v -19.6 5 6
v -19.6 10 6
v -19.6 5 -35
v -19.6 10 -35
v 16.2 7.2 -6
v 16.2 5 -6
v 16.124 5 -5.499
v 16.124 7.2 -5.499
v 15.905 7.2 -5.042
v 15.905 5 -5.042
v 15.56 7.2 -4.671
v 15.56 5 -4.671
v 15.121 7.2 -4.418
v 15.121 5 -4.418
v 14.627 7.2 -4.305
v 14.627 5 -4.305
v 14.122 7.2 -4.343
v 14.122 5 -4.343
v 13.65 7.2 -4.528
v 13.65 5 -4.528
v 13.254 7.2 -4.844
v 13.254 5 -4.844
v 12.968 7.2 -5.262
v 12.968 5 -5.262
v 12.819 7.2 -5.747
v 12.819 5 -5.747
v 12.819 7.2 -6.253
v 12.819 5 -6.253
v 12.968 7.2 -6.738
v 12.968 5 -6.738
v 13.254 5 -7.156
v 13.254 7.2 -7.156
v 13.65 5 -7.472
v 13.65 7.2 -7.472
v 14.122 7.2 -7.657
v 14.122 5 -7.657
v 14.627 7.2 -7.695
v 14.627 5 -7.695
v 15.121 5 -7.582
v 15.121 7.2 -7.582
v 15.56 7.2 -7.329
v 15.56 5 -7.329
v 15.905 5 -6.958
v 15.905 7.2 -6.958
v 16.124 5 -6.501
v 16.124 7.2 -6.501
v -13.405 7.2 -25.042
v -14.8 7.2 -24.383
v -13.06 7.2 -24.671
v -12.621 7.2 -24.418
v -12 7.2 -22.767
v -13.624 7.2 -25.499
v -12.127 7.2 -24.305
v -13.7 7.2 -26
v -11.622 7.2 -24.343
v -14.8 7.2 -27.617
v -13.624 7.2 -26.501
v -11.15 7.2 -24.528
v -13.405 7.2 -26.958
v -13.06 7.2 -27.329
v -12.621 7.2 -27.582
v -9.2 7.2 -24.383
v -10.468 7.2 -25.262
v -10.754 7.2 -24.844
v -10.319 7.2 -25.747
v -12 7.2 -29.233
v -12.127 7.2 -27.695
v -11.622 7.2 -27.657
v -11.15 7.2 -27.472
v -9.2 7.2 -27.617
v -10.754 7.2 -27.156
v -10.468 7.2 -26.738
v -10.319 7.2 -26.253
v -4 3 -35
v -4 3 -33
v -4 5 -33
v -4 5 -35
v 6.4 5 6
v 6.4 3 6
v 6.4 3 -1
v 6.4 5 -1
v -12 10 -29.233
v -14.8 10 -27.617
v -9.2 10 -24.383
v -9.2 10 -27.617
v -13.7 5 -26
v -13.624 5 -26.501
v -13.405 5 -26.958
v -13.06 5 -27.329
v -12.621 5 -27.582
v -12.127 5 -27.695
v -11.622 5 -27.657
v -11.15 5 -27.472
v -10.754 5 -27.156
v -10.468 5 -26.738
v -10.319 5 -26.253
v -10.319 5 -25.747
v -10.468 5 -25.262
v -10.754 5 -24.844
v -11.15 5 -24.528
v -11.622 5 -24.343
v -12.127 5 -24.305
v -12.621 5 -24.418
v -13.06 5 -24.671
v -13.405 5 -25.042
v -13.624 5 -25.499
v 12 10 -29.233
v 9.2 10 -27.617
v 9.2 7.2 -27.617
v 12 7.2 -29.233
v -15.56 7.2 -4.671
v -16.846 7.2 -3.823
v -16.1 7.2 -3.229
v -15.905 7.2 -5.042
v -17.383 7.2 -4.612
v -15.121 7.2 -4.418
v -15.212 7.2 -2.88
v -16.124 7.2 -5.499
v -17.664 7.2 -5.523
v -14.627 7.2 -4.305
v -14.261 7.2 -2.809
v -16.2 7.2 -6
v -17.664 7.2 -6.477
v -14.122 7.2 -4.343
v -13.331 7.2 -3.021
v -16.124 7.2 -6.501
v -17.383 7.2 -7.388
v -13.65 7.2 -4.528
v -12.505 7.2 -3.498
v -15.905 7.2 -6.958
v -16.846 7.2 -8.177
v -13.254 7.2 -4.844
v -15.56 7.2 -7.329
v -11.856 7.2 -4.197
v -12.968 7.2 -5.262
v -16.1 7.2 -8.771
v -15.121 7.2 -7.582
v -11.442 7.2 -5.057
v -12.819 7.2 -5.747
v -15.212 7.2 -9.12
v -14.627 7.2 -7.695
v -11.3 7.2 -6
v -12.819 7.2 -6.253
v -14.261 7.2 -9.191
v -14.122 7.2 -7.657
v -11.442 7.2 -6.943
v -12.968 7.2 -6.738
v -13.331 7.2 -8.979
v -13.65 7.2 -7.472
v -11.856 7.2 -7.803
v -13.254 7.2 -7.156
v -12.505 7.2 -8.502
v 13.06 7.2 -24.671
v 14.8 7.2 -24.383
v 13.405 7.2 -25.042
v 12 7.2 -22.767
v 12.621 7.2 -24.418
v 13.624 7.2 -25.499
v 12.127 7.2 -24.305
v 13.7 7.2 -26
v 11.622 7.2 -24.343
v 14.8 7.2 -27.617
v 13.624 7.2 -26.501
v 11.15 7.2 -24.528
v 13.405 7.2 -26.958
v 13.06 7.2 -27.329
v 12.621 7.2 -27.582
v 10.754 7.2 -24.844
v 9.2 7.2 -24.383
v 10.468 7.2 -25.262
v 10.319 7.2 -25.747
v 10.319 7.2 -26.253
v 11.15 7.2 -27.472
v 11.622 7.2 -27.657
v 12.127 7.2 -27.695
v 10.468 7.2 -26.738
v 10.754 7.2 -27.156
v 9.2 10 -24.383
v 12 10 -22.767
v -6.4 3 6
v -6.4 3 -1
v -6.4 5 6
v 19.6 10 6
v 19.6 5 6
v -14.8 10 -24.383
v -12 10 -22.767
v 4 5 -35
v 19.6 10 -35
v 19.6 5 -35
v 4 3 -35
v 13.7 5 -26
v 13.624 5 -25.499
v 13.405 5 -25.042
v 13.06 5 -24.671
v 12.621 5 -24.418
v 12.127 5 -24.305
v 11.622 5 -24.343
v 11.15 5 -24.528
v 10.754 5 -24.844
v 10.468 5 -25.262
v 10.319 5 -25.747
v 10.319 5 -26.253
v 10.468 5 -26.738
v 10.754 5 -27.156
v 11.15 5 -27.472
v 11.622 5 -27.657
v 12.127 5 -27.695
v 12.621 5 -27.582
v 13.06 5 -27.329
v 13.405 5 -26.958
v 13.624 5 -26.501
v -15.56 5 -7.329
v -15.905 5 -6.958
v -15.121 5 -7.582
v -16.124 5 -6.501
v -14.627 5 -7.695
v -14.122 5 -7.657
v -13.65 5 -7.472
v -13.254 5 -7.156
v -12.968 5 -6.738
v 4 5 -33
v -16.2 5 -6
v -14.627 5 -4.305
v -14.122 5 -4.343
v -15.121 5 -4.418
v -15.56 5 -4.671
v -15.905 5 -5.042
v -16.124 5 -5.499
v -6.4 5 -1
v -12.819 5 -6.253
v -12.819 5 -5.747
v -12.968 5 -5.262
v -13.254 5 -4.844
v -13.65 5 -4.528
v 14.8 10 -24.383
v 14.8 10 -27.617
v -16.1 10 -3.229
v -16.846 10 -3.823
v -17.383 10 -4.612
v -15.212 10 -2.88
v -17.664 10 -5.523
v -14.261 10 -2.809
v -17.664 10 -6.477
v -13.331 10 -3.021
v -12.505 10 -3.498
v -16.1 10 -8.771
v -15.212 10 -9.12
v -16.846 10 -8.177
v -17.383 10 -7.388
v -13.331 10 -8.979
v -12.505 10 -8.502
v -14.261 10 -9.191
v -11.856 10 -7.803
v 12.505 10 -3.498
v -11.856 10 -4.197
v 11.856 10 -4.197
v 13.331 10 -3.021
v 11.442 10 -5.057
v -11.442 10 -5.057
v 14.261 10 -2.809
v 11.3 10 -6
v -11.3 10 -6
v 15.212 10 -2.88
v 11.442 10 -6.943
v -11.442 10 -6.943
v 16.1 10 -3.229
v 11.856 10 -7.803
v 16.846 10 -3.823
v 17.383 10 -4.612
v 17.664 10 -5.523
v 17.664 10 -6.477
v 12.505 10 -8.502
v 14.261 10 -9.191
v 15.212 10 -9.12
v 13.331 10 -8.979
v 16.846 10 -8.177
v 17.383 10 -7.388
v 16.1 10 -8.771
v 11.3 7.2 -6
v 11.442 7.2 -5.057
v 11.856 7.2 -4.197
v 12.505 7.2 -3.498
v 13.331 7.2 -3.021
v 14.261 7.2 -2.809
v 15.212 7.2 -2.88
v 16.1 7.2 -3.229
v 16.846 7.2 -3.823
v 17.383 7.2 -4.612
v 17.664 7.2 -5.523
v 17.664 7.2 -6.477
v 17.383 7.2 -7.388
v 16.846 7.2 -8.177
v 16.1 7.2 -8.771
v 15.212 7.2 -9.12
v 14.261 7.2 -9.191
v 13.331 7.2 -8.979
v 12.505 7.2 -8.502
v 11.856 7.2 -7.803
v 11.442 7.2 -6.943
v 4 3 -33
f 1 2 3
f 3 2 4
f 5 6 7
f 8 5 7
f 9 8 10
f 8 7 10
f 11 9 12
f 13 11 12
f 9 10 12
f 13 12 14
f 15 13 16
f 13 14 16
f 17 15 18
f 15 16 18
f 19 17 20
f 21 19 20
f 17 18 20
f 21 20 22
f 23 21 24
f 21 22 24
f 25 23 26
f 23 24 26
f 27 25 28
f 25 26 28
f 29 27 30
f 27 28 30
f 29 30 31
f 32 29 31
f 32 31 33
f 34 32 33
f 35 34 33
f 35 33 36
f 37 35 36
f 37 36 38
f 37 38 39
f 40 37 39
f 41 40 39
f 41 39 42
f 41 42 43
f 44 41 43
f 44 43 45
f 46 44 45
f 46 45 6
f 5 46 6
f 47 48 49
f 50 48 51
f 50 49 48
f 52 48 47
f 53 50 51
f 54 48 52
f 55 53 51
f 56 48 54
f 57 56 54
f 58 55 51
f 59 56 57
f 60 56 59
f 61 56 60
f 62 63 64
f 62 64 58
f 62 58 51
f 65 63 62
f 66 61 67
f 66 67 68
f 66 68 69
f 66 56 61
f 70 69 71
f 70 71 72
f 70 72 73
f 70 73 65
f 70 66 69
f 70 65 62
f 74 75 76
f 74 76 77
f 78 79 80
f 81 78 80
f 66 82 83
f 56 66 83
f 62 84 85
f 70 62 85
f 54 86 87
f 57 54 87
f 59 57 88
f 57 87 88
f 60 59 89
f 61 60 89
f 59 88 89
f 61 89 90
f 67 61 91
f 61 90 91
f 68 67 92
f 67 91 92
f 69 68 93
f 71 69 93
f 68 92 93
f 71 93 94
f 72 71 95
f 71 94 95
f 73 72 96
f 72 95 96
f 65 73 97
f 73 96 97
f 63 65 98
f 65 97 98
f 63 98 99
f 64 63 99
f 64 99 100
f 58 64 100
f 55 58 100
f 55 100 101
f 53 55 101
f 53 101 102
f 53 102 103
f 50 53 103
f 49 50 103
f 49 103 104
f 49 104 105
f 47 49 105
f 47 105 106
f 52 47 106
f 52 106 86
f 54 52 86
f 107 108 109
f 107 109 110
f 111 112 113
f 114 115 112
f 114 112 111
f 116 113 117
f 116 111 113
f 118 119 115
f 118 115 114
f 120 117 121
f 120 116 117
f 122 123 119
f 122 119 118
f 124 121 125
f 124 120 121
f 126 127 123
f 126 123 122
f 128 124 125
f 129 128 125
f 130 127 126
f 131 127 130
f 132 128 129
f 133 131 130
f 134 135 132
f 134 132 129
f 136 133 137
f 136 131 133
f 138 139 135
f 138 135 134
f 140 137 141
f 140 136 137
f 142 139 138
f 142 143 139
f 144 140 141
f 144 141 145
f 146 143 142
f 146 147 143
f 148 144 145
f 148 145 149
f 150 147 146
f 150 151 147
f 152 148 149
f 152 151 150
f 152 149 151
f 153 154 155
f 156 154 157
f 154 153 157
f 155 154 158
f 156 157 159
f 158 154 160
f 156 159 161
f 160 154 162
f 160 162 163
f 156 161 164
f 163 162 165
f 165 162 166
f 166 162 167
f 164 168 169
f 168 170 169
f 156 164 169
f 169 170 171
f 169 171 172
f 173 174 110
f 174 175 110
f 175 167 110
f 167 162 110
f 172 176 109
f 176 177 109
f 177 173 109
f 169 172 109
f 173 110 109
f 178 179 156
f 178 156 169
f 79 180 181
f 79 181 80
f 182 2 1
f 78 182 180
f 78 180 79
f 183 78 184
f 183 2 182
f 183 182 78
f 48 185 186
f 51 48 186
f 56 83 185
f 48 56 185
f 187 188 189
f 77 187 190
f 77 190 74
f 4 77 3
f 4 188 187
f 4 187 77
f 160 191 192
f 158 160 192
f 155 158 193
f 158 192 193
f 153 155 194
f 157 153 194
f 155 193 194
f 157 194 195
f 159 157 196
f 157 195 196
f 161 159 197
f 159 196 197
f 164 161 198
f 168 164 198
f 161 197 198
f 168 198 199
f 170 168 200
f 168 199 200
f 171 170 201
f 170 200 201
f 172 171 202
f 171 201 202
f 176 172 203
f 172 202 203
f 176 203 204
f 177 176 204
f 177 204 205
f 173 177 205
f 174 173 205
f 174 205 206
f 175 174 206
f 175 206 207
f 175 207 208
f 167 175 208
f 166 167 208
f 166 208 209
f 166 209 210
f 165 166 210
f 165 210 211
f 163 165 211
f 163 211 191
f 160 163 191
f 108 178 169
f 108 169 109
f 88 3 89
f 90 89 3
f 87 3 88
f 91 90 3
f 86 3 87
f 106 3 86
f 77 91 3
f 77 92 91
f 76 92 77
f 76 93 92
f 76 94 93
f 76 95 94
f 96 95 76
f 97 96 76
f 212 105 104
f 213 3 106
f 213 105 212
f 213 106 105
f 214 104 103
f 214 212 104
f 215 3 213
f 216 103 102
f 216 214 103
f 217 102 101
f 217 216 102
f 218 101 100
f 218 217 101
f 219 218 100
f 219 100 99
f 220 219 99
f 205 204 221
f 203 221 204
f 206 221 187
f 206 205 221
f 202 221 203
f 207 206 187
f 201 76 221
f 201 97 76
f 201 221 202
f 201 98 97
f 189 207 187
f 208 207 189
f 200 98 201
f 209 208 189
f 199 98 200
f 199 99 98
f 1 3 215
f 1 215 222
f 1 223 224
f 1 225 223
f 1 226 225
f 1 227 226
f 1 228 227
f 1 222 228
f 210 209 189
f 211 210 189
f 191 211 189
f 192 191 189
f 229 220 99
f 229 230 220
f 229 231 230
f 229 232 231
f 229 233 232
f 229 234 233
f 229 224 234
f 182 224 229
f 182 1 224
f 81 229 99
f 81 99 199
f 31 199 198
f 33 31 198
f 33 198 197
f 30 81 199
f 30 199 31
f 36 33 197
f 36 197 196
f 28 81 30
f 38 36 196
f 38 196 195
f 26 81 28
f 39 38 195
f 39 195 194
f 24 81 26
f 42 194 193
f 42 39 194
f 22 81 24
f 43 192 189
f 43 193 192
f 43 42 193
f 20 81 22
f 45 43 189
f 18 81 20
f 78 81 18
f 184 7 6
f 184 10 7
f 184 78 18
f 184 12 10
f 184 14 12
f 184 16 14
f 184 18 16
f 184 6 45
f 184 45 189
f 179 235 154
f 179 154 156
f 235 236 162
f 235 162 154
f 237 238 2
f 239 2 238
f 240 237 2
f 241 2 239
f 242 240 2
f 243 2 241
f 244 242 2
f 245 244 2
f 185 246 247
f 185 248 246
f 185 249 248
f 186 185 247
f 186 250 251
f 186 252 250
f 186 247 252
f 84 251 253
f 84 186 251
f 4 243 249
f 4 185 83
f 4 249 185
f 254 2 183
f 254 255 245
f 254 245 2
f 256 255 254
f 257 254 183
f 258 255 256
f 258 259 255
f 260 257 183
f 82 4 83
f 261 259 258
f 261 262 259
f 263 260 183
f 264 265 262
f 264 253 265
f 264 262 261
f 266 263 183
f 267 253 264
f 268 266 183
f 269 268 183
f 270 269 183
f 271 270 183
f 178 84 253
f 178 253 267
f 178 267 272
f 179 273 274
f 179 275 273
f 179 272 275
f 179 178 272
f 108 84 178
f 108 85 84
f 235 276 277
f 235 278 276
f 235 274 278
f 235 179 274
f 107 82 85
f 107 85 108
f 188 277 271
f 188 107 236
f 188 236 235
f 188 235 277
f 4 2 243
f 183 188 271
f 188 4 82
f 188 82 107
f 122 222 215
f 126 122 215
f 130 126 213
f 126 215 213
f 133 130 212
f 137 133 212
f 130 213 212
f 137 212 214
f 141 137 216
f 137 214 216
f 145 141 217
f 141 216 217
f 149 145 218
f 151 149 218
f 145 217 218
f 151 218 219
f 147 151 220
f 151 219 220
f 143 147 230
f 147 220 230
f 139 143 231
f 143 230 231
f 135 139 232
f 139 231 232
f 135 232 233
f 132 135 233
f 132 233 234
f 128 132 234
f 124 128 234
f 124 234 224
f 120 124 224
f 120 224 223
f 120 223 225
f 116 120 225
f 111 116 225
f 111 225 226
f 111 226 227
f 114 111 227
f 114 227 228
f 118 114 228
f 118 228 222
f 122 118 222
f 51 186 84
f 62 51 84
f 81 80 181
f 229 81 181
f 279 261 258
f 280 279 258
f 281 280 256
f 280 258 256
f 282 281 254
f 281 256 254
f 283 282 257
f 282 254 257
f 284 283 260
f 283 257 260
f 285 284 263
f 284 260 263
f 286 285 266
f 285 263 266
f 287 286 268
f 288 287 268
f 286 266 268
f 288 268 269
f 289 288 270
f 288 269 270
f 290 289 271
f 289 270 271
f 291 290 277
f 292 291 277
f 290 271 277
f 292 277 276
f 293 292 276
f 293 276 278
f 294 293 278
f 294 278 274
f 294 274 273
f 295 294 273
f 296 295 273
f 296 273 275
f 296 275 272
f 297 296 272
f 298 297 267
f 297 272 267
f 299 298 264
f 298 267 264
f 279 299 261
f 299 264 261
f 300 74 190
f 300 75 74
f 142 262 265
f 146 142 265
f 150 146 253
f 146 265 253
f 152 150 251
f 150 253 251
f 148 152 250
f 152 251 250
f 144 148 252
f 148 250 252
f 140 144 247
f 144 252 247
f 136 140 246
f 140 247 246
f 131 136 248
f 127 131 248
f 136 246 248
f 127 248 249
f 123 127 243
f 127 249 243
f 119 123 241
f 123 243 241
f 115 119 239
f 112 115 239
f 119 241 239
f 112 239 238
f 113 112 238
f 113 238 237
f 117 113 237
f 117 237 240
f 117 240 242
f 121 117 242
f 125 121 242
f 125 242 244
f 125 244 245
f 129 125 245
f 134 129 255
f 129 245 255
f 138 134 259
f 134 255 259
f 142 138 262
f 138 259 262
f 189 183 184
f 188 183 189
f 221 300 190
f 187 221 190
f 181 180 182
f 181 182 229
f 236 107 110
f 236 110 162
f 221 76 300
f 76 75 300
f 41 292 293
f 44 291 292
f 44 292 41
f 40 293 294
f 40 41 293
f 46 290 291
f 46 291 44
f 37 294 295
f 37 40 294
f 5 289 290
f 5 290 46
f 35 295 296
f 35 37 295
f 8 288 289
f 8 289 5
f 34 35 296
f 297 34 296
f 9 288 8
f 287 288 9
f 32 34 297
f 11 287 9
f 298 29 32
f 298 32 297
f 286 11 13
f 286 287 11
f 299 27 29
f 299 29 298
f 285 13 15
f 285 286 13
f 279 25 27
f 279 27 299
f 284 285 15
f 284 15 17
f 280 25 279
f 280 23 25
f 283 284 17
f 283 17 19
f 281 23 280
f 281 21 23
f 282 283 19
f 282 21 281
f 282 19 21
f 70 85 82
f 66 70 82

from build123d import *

# Parameters (mm, degrees)
SKETCH_1_W          = 40
SKETCH_1_H          = 20
EXTRUDE_1_DEPTH     = 6
SKETCH_2_W          = 40
SKETCH_2_H          = 32.5
EXTRUDE_2_DEPTH     = 35
CUT_EXTRUDE_1_DEPTH = 13
CUT_EXTRUDE_2_DEPTH = 2
SKETCH_6_W          = 40
SKETCH_6_H          = 41
CUT_EXTRUDE_3_DEPTH = 5
SKETCH_8_R          = 1.7
CUT_EXTRUDE_4_DEPTH = 49.79805324
SKETCH_9_W          = 40
SKETCH_9_H          = 12.5
SKETCH_9_H_2        = 8
CUT_EXTRUDE_5_DEPTH = 41
CUT_EXTRUDE_6_DEPTH = 2
SKETCH_11_R         = 3.2
CUT_EXTRUDE_7_DEPTH = 2.8
SKETCH_12_W         = 0.4
SKETCH_12_H         = 41
CUT_EXTRUDE_8_DEPTH = 5


with BuildPart() as part:
    # Эскиз1 → Бобышка-Вытянуть1 (new body)
    with BuildSketch(Plane.XY):
        Rectangle(SKETCH_1_W, SKETCH_1_H)
    extrude(amount=EXTRUDE_1_DEPTH)

    # Эскиз2 → Бобышка-Вытянуть2 (add)
    with BuildSketch(Plane(origin=(0, 0, 0), x_dir=(-1, 0, 0), z_dir=(0, 0, -1))):
        with Locations((0, 6.25)):
            Rectangle(SKETCH_2_W, SKETCH_2_H)
    extrude(amount=EXTRUDE_2_DEPTH)

    # Эскиз3 → Вырез-Вытянуть1 (cut)
    with BuildSketch(Plane.XZ.offset(10)):
        Polygon((-7, 6), (-7, -1), (-9, -1), (-9, -23), (-6.5, -26), (-6.5, -33), (-4.5, -33), (-4.5, -35), (4.5, -35), (4.5, -33), (6.5, -33), (6.5, -26), (9, -23), (9, -1), (7, -1), (7, 6), align=None)
    extrude(amount=-CUT_EXTRUDE_1_DEPTH, mode=Mode.SUBTRACT)

    # Эскиз5 → Вырез-Вытянуть2 (cut)
    with BuildSketch(Plane.XZ.offset(-3)):
        Polygon((-9, -1), (9, -1), (9, -23), (6.5, -26), (6.5, -33), (-6.5, -33), (-6.5, -26), (-9, -23), align=None)
    extrude(amount=-CUT_EXTRUDE_2_DEPTH, mode=Mode.SUBTRACT)

    # Эскиз6 → Вырез-Вытянуть3 (cut)
    with BuildSketch(Plane.XZ.offset(10)):
        with Locations((0, -14.5)):
            Rectangle(SKETCH_6_W, SKETCH_6_H)
    extrude(amount=-CUT_EXTRUDE_3_DEPTH, mode=Mode.SUBTRACT)

    # Эскиз8 → Вырез-Вытянуть4 (cut, through all)
    with BuildSketch(Plane.XZ.offset(5)):
        with Locations((12, -26)):
            Circle(SKETCH_8_R)
        with Locations((14.5, -6)):
            Circle(SKETCH_8_R)
        with Locations(Location((-12, -26, 0), (0, 0, 180))):
            Circle(SKETCH_8_R)
        with Locations(Location((-14.5, -6, 0), (0, 0, 180))):
            Circle(SKETCH_8_R)
    extrude(amount=-CUT_EXTRUDE_4_DEPTH, mode=Mode.SUBTRACT)

    # Эскиз9 → Вырез-Вытянуть5 (cut)
    with BuildSketch(Plane.XY.offset(6)):
        with Locations((0, 16.25)):
            Rectangle(SKETCH_9_W, SKETCH_9_H)
        with Locations((0, -1)):
            Rectangle(SKETCH_9_W, SKETCH_9_H_2)
    extrude(amount=-CUT_EXTRUDE_5_DEPTH, mode=Mode.SUBTRACT)

    # Эскиз10 → Вырез-Вытянуть6 (cut)
    with BuildSketch(Plane.XZ.offset(-3)):
        Polygon((-20, 6), (-6.4, 6), (-6.4, -1), (-4, -33), (-4, -35), (-20, -35), align=None)
    cut_extrude_6 = extrude(amount=-CUT_EXTRUDE_6_DEPTH, mode=Mode.SUBTRACT)

    # Зеркальное отражение1: Вырез-Вытянуть6 across plane
    add(cut_extrude_6.mirror(Plane(origin=(0, 0, 0), x_dir=(0, 0, 1), z_dir=(1, 0, 0))), mode=Mode.SUBTRACT)

    # Эскиз11 → Вырез-Вытянуть7 (cut)
    with BuildSketch(Plane(origin=(0, 10, 0), x_dir=(1, 0, 0), z_dir=(0, 1, 0))):
        with Locations(Location((14.5, 6, 0), (0, 0, 180))):
            Circle(SKETCH_11_R)
        with Locations((-14.5, 6)):
            Circle(SKETCH_11_R)
        Polygon((-12, 29.233161507), (-14.8, 27.616580754), (-14.8, 24.383419246), (-12, 22.766838493), (-9.2, 24.383419246), (-9.2, 27.616580754), align=None)
        Polygon((9.2, 27.616580754), (12, 29.233161507), (14.8, 27.616580754), (14.8, 24.383419246), (12, 22.766838493), (9.2, 24.383419246), align=None)
    extrude(amount=-CUT_EXTRUDE_7_DEPTH, mode=Mode.SUBTRACT)

    # Эскиз12 → Вырез-Вытянуть8 (cut)
    with BuildSketch(Plane(origin=(0, 10, 0), x_dir=(1, 0, 0), z_dir=(0, 1, 0))):
        with Locations((-19.8, 14.5)):
            Rectangle(SKETCH_12_W, SKETCH_12_H)
        with Locations((19.8, 14.5)):
            Rectangle(SKETCH_12_W, SKETCH_12_H)
    extrude(amount=-CUT_EXTRUDE_8_DEPTH, mode=Mode.SUBTRACT)


solid = part.part
